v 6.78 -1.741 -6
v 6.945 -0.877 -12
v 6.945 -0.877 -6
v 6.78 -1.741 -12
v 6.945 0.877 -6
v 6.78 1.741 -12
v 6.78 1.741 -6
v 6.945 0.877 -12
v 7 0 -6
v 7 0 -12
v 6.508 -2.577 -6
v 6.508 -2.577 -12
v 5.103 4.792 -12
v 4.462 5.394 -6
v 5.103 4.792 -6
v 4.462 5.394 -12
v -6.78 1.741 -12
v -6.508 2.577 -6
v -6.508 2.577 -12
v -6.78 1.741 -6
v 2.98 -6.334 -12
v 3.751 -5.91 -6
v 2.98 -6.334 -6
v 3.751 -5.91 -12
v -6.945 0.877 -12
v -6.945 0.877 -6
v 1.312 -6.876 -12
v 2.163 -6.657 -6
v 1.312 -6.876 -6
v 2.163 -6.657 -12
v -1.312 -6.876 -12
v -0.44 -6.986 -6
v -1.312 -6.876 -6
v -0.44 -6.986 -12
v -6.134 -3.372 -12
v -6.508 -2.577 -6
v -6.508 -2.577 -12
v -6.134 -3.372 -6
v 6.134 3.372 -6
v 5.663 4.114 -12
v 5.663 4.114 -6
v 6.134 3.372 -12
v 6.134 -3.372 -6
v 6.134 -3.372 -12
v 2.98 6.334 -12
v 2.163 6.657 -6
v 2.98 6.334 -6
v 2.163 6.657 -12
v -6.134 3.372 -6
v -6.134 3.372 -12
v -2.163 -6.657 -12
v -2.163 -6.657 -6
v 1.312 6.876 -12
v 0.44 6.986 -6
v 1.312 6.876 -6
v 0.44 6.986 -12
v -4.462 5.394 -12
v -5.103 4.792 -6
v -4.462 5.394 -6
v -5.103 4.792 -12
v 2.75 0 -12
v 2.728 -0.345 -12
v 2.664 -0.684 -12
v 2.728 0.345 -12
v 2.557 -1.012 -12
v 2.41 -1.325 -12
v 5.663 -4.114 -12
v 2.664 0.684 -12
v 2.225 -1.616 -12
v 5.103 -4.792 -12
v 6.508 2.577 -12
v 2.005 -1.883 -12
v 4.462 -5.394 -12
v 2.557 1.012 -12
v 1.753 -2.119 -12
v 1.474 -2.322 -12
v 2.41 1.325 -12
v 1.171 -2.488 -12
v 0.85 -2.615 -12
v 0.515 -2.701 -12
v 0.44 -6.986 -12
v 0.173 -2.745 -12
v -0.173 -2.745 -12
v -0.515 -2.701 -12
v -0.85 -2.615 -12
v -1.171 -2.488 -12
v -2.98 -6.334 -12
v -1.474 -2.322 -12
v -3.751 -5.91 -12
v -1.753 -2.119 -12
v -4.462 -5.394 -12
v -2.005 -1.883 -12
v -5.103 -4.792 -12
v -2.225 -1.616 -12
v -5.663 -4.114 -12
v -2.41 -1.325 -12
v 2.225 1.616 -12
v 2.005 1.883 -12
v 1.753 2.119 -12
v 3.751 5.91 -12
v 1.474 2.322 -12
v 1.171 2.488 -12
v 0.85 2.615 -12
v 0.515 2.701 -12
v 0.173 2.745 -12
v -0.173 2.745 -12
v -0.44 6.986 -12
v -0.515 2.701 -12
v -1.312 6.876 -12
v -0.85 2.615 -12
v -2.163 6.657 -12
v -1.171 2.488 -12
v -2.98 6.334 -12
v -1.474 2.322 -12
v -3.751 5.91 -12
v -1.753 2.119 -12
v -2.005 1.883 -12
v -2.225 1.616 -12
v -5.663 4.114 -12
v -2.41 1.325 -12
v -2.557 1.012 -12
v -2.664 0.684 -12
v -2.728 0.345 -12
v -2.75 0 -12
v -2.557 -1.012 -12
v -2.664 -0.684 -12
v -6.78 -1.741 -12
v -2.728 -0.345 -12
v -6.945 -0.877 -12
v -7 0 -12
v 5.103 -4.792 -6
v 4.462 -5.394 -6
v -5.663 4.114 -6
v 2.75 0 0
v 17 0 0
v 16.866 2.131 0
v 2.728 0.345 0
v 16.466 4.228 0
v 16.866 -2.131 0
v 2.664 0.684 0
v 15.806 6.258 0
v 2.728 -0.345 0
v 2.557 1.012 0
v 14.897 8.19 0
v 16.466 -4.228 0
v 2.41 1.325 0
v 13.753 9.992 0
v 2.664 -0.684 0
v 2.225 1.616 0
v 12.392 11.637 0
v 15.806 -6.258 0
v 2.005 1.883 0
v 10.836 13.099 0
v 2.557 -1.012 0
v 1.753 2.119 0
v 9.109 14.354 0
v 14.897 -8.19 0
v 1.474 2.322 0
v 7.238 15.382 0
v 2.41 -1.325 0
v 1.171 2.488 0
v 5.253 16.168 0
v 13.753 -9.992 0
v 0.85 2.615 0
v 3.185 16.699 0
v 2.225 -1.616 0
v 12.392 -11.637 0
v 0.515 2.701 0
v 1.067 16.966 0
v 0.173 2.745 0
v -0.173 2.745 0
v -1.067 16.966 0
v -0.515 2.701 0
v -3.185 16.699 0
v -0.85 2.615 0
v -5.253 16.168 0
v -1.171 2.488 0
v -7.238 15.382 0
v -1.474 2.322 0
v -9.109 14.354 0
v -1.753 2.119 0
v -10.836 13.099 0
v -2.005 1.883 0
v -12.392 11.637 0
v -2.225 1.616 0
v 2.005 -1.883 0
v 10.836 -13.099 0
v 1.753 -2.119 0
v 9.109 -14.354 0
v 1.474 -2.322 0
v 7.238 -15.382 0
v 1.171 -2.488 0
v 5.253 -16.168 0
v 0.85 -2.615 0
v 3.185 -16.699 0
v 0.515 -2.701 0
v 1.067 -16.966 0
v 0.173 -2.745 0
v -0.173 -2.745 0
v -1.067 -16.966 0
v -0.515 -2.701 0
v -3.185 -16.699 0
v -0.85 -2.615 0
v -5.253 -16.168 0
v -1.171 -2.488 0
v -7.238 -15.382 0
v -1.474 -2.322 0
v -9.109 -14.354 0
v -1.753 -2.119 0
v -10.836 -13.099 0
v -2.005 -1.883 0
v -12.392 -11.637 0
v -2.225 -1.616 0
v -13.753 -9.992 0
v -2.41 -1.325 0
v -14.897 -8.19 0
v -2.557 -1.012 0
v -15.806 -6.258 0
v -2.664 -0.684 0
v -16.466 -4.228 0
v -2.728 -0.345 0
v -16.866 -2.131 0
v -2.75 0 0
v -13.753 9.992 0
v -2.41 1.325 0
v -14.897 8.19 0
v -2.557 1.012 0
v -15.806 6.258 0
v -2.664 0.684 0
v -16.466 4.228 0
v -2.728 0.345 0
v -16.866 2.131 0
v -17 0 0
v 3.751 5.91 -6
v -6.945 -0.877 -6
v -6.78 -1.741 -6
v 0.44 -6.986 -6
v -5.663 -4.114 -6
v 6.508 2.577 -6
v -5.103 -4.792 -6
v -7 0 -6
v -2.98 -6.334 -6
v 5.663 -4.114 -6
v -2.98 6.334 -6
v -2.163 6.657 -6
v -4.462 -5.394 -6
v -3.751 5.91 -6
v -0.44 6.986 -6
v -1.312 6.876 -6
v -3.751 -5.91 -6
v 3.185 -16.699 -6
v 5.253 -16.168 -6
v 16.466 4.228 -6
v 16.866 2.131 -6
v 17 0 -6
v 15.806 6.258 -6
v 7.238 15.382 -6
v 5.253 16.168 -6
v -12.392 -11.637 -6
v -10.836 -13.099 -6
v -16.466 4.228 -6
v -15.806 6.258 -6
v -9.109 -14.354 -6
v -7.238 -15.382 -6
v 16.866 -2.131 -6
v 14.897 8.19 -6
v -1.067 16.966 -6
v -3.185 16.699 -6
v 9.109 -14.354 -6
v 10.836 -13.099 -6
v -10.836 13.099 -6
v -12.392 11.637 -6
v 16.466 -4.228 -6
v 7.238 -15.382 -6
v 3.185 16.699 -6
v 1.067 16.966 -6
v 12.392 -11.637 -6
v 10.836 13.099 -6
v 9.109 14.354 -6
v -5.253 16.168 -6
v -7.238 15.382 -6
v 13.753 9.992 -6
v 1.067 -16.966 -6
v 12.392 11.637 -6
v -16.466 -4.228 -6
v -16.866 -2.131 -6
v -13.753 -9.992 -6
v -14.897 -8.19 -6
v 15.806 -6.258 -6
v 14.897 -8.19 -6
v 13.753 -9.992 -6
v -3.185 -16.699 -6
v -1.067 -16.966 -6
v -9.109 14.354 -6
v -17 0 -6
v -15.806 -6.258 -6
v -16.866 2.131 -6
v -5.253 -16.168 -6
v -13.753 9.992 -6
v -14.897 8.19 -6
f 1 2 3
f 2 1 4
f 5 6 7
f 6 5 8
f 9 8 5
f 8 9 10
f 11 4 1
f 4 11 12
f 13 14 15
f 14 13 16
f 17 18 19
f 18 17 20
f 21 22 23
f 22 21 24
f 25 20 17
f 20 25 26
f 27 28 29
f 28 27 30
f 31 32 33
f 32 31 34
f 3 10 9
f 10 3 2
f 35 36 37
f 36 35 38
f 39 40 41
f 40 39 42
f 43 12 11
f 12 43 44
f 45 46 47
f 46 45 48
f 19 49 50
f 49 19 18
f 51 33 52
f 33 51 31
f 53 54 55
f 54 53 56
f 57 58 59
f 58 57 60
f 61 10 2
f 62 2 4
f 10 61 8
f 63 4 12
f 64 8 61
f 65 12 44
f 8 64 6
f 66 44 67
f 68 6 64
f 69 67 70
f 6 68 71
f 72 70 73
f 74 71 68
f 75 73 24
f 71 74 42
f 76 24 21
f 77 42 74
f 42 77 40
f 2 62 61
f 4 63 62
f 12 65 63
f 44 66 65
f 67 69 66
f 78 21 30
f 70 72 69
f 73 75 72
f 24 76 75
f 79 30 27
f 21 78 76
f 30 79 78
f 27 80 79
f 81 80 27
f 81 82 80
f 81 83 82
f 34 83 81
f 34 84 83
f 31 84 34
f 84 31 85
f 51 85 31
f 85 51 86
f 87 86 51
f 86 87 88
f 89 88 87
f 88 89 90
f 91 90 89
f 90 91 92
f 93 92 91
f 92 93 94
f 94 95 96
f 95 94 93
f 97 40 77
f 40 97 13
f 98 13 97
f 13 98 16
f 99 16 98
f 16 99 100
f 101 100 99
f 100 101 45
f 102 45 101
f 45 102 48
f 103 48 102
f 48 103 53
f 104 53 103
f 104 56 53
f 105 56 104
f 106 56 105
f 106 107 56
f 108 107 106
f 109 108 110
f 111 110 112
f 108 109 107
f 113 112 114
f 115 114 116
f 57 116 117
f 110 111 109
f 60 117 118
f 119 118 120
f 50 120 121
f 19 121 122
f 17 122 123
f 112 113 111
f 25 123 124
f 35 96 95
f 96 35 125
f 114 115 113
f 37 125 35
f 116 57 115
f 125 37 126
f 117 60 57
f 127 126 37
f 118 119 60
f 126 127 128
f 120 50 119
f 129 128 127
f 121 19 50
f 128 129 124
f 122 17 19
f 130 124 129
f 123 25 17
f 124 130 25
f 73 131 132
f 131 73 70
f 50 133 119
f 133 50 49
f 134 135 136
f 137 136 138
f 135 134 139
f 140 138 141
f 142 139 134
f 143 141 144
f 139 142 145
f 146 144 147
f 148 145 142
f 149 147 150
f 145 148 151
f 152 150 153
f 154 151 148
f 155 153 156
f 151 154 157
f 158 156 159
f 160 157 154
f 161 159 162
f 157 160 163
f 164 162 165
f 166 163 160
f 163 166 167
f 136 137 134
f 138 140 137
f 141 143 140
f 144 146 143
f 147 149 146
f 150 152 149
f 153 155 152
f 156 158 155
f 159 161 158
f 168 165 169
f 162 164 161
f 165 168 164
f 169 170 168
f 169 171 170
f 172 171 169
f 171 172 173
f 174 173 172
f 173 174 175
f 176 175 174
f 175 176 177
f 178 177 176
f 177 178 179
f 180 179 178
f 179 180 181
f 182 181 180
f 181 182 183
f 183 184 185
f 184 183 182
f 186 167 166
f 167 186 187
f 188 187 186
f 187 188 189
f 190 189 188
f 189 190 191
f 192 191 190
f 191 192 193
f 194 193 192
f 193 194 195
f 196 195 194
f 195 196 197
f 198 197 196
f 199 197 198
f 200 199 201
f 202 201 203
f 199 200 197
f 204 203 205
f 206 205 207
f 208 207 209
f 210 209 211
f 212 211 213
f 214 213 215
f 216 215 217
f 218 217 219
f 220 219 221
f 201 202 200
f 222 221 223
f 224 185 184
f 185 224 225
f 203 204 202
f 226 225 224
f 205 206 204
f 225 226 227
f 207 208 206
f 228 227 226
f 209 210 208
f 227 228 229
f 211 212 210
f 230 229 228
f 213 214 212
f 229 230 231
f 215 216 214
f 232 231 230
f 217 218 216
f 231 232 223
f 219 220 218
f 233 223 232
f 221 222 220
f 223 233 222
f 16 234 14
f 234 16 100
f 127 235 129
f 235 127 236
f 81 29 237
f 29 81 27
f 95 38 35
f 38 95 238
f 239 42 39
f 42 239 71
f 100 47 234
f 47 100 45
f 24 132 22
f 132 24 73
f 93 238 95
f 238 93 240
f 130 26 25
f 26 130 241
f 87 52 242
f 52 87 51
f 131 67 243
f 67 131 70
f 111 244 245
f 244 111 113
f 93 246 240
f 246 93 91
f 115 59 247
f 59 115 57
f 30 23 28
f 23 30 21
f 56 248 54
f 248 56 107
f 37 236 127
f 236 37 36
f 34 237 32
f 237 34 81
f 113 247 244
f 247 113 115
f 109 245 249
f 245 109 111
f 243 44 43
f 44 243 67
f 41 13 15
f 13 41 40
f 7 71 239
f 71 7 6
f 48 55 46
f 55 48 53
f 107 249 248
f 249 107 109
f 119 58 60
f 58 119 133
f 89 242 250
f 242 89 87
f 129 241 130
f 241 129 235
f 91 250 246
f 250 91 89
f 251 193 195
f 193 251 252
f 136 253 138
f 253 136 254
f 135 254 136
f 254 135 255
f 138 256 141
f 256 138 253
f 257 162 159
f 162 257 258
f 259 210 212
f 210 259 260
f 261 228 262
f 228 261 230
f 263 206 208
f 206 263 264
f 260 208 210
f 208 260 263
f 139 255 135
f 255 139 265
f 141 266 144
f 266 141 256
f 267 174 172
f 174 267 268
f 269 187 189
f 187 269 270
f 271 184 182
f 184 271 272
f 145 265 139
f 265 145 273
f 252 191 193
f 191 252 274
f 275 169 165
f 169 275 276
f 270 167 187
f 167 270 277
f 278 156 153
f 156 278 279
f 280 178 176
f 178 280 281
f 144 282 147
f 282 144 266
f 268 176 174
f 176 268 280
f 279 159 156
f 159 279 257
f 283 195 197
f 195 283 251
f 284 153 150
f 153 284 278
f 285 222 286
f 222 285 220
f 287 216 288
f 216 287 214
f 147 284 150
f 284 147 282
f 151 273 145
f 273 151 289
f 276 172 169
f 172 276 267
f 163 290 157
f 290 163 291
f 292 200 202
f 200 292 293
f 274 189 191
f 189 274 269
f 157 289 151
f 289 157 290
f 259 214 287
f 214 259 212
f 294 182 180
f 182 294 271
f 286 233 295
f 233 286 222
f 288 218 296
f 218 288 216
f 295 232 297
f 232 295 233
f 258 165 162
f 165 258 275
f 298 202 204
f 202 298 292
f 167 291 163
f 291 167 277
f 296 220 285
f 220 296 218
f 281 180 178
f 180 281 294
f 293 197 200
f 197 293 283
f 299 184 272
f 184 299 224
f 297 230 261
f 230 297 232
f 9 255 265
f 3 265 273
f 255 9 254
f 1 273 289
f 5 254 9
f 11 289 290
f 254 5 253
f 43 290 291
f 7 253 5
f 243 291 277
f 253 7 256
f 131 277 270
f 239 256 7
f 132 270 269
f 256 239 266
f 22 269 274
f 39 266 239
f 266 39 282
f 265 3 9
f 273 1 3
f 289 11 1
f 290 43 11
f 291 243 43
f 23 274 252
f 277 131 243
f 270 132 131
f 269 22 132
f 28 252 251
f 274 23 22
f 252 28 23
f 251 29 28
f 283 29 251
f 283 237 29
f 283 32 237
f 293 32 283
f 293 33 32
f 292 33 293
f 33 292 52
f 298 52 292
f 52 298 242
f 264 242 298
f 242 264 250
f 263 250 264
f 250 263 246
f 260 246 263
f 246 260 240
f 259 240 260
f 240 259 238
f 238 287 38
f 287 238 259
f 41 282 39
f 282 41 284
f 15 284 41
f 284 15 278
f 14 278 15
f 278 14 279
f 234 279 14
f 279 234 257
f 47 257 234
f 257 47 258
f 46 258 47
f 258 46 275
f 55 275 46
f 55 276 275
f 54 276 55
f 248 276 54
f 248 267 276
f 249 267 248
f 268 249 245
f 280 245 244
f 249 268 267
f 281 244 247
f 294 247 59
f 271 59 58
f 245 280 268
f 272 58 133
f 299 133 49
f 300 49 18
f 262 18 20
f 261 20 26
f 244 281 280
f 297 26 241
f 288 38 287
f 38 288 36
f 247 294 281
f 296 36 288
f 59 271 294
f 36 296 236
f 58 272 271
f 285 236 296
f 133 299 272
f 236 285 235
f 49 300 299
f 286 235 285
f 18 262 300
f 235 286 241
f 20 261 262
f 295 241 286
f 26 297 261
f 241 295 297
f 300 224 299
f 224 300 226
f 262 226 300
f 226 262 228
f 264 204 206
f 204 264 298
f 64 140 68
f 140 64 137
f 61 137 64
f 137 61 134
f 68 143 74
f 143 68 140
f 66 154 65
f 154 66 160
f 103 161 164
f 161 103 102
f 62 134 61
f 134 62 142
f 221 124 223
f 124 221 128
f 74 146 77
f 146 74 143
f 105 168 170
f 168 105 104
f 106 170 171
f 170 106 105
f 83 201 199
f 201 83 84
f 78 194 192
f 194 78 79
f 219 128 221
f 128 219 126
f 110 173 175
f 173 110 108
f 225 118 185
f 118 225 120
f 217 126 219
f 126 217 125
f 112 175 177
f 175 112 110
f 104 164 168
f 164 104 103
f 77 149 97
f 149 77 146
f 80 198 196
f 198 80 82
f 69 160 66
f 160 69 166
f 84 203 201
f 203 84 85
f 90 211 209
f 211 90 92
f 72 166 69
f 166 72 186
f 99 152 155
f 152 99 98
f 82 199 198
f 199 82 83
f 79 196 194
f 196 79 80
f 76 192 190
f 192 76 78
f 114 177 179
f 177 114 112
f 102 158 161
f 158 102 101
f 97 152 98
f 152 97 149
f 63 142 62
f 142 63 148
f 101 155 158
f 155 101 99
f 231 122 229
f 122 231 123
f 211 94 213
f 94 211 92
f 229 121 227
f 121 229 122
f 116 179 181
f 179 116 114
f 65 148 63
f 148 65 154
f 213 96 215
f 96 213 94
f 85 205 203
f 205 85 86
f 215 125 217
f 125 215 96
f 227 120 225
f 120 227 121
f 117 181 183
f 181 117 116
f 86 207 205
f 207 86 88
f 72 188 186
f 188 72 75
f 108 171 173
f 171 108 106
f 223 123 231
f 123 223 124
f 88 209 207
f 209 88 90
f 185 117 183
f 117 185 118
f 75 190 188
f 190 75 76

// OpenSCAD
$fn = 50;


difference() {
	union() {
		translate(v = [0, 0, -12.0000000000]) {
			cylinder(h = 12, r = 7.0000000000);
		}
		translate(v = [0, 0, -6.0000000000]) {
			cylinder(h = 6, r = 17.0000000000);
		}
	}
	union() {
		#translate(v = [0, 0, -12]) {
			cylinder(h = 12, r = 2.7500000000);
		}
	}
}
